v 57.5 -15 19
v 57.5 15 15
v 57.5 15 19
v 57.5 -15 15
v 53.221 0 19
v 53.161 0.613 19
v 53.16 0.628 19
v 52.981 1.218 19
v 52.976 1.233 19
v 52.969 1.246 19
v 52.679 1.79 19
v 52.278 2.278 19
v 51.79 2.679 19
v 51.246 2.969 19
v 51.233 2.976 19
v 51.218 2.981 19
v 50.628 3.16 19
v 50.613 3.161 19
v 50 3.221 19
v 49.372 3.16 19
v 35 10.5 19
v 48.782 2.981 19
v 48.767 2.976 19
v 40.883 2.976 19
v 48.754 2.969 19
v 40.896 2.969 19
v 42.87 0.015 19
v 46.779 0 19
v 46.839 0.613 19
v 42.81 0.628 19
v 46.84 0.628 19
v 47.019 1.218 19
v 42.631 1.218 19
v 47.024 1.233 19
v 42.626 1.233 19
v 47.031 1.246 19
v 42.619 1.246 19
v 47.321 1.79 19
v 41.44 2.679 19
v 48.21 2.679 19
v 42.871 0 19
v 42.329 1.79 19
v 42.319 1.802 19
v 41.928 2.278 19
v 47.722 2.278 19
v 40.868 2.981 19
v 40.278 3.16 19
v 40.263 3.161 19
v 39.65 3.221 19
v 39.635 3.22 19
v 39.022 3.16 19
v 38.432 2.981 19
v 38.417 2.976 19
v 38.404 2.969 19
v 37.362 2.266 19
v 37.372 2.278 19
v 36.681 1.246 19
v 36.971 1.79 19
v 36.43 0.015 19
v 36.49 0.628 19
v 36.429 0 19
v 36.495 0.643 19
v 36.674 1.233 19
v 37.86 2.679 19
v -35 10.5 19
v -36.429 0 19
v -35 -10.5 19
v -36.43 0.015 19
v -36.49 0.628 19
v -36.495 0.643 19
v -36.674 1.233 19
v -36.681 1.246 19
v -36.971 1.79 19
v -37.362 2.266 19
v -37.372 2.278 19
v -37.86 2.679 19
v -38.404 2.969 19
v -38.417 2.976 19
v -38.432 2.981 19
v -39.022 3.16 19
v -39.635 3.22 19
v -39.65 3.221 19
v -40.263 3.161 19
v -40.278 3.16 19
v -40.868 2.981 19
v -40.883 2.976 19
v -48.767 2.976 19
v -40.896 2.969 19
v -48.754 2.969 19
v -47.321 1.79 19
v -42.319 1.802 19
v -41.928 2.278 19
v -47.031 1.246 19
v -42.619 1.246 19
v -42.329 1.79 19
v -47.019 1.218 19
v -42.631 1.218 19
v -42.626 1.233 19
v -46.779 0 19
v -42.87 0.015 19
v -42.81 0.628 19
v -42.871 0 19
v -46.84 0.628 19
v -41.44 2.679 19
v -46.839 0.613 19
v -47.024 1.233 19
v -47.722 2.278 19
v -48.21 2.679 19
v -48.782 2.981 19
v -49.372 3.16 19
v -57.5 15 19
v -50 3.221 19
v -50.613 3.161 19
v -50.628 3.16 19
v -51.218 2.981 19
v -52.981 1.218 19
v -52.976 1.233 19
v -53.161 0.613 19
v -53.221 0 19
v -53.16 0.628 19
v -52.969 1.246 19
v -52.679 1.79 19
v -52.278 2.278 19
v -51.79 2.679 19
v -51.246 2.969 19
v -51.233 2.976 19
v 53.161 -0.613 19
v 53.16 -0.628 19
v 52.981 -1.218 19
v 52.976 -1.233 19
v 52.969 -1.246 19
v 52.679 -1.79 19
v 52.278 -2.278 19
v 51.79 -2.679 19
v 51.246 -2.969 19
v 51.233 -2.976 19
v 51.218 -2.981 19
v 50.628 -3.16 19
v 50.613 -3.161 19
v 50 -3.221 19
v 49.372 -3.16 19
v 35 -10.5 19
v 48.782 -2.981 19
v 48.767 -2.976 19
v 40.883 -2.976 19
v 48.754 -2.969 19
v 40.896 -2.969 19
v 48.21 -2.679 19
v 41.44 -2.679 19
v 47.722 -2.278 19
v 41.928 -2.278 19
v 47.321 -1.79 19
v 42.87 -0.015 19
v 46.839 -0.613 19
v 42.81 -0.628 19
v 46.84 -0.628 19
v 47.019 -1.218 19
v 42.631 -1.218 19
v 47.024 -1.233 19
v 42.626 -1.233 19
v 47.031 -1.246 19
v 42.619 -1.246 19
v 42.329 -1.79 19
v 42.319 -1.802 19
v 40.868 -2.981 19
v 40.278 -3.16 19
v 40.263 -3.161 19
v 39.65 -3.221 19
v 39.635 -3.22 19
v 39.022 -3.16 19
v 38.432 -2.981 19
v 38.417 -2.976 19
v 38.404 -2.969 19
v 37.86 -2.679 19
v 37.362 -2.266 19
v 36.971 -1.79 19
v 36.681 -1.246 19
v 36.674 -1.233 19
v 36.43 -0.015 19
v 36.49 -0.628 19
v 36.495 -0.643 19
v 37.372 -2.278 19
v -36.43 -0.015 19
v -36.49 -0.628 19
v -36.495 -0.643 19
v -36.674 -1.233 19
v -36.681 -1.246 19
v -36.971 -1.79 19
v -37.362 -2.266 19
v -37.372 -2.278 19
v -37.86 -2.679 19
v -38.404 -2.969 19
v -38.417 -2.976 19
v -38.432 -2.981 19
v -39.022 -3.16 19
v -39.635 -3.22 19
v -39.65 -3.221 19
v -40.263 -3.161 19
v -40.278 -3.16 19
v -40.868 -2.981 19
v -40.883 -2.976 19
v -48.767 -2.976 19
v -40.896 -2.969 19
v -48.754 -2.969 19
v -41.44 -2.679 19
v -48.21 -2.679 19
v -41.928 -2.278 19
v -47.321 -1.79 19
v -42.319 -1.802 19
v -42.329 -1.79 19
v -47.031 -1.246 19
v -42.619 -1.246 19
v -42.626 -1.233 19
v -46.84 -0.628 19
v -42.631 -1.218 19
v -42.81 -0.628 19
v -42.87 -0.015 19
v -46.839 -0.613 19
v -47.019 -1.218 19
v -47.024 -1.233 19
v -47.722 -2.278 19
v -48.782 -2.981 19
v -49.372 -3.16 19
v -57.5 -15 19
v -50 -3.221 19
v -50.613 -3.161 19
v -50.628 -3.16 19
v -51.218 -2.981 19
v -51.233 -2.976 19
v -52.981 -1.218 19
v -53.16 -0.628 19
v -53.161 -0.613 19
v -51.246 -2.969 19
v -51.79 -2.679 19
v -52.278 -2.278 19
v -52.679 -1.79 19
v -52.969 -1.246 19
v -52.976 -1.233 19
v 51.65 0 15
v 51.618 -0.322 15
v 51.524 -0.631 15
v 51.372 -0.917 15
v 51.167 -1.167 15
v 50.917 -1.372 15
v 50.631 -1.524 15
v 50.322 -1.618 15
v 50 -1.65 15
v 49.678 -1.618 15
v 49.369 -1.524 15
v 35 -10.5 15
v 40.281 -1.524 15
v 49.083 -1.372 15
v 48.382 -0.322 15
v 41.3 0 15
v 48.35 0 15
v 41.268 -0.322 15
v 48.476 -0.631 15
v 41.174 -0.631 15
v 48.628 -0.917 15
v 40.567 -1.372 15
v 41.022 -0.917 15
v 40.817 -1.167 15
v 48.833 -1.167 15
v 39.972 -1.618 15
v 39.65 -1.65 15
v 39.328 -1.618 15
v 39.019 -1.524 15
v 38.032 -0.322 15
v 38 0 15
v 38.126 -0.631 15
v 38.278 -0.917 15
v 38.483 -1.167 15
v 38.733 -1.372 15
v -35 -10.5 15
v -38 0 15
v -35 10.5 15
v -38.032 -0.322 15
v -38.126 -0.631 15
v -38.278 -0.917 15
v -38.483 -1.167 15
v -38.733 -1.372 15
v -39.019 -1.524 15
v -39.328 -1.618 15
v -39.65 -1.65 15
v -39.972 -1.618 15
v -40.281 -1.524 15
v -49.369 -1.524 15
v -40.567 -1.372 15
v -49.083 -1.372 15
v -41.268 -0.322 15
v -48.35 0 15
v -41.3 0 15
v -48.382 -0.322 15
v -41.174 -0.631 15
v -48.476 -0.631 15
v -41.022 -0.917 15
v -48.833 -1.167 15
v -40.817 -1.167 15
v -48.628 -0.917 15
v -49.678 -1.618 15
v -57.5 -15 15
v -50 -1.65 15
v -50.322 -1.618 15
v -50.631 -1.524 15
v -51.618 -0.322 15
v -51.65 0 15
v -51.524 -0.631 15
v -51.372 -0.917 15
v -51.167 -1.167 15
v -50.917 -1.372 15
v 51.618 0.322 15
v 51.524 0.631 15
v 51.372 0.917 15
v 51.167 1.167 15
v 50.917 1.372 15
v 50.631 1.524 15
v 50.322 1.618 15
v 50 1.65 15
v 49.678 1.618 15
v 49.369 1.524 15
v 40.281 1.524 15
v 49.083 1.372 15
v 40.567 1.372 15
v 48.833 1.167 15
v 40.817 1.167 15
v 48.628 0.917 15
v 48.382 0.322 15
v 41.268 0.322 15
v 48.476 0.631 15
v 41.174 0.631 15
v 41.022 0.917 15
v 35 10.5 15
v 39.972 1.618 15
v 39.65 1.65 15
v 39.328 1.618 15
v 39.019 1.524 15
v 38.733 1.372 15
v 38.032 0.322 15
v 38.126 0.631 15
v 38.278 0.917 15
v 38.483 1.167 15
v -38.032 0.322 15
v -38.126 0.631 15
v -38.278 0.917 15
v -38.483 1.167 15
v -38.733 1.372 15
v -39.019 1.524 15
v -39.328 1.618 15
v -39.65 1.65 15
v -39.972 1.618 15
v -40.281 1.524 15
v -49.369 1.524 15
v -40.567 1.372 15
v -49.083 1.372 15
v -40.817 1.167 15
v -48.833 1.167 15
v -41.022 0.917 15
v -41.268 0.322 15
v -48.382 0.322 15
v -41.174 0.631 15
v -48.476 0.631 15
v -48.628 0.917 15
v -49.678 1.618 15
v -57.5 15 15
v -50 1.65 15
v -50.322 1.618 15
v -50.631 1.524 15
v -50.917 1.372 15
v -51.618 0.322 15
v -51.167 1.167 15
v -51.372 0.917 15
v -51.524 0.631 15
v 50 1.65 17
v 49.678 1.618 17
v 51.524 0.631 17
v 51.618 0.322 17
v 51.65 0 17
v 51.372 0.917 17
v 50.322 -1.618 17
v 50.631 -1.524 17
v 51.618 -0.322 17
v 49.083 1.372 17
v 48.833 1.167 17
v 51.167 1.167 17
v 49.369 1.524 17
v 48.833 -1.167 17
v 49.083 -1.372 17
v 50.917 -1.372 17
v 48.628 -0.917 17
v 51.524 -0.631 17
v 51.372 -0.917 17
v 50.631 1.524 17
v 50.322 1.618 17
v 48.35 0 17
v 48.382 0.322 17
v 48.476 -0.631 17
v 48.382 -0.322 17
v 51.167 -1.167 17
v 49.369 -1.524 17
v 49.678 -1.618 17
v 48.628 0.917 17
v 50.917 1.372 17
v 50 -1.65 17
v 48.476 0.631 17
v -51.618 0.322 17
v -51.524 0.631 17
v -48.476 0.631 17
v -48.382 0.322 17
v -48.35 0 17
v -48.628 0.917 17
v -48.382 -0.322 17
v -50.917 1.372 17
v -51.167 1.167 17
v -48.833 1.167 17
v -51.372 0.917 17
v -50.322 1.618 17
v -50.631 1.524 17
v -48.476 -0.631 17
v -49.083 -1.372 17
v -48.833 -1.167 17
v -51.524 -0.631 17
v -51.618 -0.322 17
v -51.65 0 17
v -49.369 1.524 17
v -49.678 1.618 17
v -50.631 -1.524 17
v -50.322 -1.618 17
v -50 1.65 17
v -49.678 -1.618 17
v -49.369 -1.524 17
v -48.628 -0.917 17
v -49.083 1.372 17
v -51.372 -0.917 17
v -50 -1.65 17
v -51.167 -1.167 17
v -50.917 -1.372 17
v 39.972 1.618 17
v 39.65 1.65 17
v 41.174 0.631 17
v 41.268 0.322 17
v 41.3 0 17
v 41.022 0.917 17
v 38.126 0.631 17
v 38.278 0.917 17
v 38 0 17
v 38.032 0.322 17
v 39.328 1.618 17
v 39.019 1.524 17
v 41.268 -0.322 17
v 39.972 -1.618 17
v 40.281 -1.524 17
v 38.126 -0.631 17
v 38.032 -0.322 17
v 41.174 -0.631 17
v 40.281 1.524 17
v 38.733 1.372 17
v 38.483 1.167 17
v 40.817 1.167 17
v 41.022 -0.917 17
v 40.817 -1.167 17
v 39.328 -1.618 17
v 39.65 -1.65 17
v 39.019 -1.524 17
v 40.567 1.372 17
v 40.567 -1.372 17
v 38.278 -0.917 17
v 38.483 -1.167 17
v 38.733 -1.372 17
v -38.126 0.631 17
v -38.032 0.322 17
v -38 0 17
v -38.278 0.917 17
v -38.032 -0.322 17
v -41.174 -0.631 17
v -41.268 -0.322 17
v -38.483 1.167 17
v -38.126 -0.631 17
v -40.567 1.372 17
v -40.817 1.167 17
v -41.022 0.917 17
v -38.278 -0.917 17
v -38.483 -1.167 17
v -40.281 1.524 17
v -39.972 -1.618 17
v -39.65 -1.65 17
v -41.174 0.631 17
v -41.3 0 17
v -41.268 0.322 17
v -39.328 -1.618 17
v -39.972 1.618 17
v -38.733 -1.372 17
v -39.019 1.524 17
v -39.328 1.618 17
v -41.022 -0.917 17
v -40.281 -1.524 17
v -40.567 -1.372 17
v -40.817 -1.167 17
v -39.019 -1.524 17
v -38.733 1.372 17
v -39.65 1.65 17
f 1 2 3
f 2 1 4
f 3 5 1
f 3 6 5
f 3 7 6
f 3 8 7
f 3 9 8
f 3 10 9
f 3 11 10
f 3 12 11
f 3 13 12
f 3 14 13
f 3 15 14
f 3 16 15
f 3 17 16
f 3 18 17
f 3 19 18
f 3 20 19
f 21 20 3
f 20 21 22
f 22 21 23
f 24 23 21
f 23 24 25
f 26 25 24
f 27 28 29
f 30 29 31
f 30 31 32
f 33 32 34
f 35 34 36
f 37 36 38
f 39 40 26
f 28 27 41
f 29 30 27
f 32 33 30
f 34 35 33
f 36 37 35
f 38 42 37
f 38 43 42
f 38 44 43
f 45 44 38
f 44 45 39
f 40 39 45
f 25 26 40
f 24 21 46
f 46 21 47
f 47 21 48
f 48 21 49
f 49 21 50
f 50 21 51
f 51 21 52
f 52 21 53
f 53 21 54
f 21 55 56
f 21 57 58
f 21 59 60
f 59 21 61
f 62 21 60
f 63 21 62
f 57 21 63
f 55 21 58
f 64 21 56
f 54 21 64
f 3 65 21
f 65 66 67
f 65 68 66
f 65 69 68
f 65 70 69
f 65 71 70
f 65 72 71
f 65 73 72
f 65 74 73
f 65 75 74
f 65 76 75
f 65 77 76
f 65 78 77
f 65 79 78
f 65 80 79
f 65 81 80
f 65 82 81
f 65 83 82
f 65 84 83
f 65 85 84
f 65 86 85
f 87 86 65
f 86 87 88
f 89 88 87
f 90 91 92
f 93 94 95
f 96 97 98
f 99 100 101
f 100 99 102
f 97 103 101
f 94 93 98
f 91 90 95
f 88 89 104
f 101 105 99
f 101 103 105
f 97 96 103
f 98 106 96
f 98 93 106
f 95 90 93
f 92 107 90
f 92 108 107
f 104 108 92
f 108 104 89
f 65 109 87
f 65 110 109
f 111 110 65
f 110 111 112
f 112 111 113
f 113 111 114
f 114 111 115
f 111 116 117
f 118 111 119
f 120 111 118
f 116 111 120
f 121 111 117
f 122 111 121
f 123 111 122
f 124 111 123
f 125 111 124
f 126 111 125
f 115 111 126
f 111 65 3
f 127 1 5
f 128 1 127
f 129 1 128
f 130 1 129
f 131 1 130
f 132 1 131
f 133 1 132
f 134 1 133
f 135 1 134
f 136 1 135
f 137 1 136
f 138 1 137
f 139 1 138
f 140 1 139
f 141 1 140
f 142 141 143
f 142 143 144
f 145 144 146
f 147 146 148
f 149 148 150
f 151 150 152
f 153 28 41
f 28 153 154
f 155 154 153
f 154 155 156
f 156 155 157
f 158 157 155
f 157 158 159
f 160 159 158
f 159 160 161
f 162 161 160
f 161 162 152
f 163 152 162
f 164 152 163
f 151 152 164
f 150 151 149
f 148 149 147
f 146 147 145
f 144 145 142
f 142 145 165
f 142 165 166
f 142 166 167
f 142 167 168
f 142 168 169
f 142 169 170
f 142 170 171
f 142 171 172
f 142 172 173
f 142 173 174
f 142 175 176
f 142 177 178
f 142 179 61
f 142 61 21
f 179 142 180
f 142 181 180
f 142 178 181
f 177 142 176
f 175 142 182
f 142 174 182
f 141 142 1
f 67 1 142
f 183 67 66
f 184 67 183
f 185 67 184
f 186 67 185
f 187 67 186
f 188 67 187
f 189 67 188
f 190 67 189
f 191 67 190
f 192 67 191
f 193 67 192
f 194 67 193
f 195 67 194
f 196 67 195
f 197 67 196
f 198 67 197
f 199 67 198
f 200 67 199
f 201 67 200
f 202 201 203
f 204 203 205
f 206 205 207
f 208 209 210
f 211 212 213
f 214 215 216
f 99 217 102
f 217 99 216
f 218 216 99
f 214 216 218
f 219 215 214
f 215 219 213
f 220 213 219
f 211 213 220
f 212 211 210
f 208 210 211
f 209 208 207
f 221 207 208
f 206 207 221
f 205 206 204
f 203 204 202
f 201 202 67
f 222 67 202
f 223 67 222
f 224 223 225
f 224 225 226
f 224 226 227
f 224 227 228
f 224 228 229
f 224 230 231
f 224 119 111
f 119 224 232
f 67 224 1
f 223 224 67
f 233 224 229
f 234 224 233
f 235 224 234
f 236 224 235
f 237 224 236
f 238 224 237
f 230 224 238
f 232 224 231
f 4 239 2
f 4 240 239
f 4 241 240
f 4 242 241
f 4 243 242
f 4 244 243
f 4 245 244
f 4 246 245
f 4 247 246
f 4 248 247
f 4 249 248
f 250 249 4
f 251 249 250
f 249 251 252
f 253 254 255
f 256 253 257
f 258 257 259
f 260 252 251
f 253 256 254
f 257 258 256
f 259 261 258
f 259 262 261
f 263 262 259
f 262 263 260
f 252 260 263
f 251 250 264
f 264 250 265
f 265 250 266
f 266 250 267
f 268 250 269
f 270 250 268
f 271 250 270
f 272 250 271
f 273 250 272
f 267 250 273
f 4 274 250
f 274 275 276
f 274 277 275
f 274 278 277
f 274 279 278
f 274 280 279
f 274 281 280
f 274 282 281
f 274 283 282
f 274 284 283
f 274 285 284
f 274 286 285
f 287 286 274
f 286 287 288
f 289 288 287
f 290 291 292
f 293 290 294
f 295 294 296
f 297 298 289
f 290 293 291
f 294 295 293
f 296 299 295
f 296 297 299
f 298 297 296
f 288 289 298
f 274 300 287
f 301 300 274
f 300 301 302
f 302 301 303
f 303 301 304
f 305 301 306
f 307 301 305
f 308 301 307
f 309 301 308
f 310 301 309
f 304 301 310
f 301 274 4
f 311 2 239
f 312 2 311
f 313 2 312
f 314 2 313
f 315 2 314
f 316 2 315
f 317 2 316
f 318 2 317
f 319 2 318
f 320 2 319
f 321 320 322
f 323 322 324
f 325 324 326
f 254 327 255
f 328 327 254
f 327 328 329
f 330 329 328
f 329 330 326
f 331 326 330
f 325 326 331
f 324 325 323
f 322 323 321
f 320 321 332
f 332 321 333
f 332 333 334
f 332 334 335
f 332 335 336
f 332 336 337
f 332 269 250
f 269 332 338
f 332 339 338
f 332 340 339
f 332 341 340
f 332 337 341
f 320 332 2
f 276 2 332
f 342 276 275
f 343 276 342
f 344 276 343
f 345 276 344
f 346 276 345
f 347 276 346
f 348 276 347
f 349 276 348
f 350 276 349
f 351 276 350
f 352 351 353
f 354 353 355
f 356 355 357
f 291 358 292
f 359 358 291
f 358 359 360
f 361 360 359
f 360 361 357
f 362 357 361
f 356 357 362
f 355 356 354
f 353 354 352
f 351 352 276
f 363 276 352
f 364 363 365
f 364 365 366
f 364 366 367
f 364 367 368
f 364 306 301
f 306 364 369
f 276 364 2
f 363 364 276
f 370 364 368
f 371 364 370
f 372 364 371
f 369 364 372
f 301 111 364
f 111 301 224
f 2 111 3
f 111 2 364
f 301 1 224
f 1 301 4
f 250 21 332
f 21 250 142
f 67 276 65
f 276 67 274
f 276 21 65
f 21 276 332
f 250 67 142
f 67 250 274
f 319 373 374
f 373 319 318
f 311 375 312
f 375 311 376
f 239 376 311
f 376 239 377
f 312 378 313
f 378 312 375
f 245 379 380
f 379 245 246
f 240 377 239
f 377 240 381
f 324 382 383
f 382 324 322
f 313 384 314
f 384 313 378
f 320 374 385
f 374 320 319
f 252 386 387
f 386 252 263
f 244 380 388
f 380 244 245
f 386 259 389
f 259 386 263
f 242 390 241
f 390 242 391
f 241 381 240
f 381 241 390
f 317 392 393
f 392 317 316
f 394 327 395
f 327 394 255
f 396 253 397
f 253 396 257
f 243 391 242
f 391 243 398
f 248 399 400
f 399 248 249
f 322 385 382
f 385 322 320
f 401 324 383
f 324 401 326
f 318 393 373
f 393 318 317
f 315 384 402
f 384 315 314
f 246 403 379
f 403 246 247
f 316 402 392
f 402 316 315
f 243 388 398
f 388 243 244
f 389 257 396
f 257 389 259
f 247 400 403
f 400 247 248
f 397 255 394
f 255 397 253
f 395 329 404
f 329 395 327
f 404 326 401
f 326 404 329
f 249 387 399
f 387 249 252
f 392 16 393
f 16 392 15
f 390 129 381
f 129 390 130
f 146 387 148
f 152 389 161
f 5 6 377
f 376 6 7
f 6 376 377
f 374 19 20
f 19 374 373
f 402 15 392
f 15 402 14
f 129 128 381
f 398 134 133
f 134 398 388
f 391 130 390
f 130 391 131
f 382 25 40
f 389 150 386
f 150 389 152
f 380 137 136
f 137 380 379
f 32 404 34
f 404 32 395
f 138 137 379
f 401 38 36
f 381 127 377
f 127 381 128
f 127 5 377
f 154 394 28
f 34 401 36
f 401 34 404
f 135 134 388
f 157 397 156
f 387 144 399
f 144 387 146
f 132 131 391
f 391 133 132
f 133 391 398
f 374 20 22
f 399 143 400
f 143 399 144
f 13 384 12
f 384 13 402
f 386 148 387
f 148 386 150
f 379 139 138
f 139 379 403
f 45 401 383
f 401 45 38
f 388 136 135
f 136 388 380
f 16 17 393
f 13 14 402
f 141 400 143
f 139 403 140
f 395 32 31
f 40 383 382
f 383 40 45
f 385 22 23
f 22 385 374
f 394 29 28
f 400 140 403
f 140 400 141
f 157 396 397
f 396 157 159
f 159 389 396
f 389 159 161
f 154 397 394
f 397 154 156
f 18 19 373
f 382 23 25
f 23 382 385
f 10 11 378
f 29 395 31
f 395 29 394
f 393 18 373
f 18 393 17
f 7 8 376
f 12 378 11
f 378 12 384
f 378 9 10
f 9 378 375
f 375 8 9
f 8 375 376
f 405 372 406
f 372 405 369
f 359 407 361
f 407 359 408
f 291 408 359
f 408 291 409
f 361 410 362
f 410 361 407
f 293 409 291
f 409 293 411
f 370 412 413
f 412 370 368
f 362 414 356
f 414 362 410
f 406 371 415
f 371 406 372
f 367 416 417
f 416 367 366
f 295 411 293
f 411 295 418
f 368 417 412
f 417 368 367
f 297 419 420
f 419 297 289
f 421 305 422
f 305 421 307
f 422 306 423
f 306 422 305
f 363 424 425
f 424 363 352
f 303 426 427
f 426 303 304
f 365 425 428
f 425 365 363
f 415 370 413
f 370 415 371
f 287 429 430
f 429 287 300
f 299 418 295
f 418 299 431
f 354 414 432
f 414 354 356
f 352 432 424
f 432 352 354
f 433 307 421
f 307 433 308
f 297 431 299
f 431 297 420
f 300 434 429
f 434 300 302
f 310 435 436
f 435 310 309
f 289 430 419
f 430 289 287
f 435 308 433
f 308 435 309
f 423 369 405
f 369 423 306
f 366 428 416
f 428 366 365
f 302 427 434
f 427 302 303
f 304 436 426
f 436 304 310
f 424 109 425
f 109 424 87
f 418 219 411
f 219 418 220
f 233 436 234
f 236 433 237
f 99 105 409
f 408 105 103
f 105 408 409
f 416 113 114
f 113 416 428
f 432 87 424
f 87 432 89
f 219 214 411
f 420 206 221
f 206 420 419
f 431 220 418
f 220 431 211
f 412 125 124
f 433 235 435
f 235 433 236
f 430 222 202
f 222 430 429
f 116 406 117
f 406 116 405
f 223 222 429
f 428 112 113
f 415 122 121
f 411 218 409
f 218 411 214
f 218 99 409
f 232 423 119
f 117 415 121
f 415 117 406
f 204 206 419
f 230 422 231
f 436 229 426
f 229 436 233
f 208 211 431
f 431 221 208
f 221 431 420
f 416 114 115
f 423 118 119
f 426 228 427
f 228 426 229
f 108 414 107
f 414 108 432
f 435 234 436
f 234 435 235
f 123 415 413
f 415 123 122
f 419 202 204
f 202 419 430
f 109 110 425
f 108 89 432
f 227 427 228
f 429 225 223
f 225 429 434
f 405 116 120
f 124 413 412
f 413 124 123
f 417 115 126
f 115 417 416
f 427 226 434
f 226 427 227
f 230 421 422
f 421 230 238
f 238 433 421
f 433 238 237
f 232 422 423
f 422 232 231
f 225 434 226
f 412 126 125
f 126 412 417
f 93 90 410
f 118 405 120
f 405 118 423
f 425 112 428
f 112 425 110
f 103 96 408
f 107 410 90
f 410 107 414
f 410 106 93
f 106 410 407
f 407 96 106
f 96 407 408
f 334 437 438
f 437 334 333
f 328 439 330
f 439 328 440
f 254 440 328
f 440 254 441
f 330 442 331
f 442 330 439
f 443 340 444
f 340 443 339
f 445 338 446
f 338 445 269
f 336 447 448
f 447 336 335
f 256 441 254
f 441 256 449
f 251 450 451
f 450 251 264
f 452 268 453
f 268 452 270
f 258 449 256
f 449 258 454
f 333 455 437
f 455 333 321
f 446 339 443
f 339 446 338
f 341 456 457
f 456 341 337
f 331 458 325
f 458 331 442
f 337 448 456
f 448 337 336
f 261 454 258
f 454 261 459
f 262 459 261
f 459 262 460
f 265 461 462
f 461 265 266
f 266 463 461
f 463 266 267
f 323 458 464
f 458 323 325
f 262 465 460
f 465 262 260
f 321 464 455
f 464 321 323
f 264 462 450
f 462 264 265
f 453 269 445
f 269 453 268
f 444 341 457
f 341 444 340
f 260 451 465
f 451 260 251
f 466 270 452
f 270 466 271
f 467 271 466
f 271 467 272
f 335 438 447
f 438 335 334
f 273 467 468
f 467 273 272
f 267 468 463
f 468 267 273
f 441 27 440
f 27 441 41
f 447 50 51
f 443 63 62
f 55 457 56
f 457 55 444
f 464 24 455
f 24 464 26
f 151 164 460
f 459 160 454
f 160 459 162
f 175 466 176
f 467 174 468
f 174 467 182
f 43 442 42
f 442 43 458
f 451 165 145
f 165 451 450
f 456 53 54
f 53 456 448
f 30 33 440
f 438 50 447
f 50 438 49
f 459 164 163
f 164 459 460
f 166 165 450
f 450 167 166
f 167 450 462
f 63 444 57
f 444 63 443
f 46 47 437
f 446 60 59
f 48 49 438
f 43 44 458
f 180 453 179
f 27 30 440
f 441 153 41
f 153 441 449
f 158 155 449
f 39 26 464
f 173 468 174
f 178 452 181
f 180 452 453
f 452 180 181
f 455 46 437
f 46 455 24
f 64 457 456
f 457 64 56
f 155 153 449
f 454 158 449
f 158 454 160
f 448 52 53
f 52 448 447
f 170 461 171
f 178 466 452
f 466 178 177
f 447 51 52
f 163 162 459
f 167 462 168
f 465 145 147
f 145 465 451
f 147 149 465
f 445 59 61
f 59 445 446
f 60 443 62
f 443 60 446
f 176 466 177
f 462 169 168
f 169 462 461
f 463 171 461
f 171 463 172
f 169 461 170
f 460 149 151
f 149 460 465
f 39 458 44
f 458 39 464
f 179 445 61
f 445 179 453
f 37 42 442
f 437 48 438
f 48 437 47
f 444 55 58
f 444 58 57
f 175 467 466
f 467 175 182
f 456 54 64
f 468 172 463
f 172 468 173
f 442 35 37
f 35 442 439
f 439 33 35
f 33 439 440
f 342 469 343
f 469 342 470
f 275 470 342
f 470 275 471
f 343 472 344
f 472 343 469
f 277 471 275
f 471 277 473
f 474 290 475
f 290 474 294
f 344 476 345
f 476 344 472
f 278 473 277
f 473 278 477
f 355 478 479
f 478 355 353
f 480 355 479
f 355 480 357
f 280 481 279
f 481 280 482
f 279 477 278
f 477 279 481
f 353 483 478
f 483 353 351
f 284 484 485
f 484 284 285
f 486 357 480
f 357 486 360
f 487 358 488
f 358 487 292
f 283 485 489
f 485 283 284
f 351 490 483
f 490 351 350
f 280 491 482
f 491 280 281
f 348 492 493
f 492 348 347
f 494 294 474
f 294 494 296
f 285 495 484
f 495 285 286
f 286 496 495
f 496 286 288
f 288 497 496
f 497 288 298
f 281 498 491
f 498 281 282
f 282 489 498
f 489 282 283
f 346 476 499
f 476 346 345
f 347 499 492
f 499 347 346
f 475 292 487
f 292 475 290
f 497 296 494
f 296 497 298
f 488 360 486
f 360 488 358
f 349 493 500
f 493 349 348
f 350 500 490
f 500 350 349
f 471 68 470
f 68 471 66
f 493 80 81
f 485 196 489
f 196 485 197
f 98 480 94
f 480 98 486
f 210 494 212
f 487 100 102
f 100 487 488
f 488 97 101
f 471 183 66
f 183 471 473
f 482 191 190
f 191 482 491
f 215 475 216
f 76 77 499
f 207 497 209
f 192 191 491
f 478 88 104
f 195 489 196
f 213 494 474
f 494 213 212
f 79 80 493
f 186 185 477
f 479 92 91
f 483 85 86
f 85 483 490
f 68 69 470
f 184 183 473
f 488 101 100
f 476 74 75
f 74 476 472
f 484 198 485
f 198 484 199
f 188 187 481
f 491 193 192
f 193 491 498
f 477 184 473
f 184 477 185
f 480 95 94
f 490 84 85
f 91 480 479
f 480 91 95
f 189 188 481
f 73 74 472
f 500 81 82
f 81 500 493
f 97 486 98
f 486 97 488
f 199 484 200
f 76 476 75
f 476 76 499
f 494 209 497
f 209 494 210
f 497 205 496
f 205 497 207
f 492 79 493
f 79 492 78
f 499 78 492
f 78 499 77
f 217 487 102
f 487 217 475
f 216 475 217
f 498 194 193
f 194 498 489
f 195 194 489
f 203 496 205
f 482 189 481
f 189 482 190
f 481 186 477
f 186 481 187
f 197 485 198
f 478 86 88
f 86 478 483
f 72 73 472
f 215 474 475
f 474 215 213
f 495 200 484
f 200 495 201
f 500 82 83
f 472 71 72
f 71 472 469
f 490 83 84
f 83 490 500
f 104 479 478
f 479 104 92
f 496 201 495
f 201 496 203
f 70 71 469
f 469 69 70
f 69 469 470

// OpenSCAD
// file: parameter.scad
nStrings=6;
nFrets=24;
nLedFrets=16;
m5Dia=5.3;
m5HeadZ=3.5;
m4Dia=4.3;
m4NutDia=8.3;
m4NutZ=3.5;
m4HeadZ=2.5;
m3Dia=3.3;
m3NutDia=6.6;
m3NutZ=2.5;
m3HeadZ=2;
strDistN=7;
strDistB=10.25;
scale=645;
neckSlotY=500;

slotXY=15;

bodySlotX=115;
bodySlotY=250;

jackYA=40;
jackYB=54;
jackZA=20;
jackZB=25;

bodyX=300;

bodyZ=40;

strDia=[1.7,1.4,1.1,0.7,0.5,0.35];

fretStrPlus=4;
fretLN=strDistN*(nStrings-1)+fretStrPlus*2;
fretLB=strDistB*(nStrings-1)+fretStrPlus*2;
strSpanB=strDistB*(nStrings-1);
strSpanN=strDistN*(nStrings-1);
fretBtmZ=1;
neckSlotX=fretLN;
neckSlotDist=neckSlotX-slotXY*2;

neck_sideT=5.5; //thicknes of the neck side locks
neck_bottomT=2.5;

neck_mntPosYA=447;
neck_mntPosYB=420;
neck_mntEndT=2.5;
neck_lastFretSpc=13;

nut_slotSink=6;

//fretY=16;
fretPcbZ=1.6;
fretDia=3.5;
fretZ=1.5;
fretOvrZ=4;
fretboardZ=fretOvrZ+fretPcbZ;



L=scale;
k=1.05946;

fretPos1=scale-(scale/pow(k,4));

function fretPos(i)=L-(L/pow(k,i));
function fretSpc(i)=(L/pow(k,i))-(L/pow(k,i+1));
function strSpc(i)=i/L*strDistB+(1-i/L)*strDistN;
function fretL(i)=(i/L*strDistB+(1-i/L)*strDistN)*(nStrings-1)+fretStrPlus*2;

echo (70-(fretL(fretPos(1))));
// main file
include <parameter.scad>;
$fn=32;
pY=20;
pX=69;
pBtmZ=6;
pZA=5;
mYO=pY+10;
mX=bodySlotX;
mXI=bodySlotX-slotXY*2;
mZ=4;
pScrwD=mXI-m3Dia-2.4;
pZ=slotXY+mZ;
pMDist=0.5;
coilZ=4.5;
coilX=7;
coilsX=67;
coilsY=7;
coilY=6.5;
coilDist=10.4;
coilSpan=nStrings*(coilDist-1);

mount();

module mount(){
difference(){
translate([-mX/2,-mYO/2,slotXY])cube([mX,mYO,mZ]);
translate([-pX/2-pMDist,-pY/2-pMDist,slotXY])cube([pX+pMDist*2,pY+pMDist*2,mZ+1]);

translate([bodySlotX/2-slotXY/2,0,slotXY])cylinder(d=m3Dia,h=mZ*2);
translate([bodySlotX/2-slotXY/2,0,slotXY+mZ-m3HeadZ])cylinder(d1=m3Dia,d2=m3Dia*2,h=m3HeadZ+0.1);

translate([-(bodySlotX/2-slotXY/2),0,slotXY])cylinder(d=m3Dia,h=mZ*2);
translate([-(bodySlotX/2-slotXY/2),0,slotXY+mZ-m3HeadZ])cylinder(d1=m3Dia,d2=m3Dia*2,h=m3HeadZ+0.1);

translate([pScrwD/2,0,slotXY])cylinder(d=m3Dia,h=mZ*2);
translate([pScrwD/2,0,slotXY+mZ-m3HeadZ])cylinder(d1=m3Dia,d2=m3Dia*2,h=m3HeadZ+0.1);

translate([-pScrwD/2,0,slotXY])cylinder(d=m3Dia,h=mZ*2);
translate([-pScrwD/2,0,slotXY+mZ-m3HeadZ])cylinder(d1=m3Dia,d2=m3Dia*2,h=m3HeadZ+0.1);
}
}
